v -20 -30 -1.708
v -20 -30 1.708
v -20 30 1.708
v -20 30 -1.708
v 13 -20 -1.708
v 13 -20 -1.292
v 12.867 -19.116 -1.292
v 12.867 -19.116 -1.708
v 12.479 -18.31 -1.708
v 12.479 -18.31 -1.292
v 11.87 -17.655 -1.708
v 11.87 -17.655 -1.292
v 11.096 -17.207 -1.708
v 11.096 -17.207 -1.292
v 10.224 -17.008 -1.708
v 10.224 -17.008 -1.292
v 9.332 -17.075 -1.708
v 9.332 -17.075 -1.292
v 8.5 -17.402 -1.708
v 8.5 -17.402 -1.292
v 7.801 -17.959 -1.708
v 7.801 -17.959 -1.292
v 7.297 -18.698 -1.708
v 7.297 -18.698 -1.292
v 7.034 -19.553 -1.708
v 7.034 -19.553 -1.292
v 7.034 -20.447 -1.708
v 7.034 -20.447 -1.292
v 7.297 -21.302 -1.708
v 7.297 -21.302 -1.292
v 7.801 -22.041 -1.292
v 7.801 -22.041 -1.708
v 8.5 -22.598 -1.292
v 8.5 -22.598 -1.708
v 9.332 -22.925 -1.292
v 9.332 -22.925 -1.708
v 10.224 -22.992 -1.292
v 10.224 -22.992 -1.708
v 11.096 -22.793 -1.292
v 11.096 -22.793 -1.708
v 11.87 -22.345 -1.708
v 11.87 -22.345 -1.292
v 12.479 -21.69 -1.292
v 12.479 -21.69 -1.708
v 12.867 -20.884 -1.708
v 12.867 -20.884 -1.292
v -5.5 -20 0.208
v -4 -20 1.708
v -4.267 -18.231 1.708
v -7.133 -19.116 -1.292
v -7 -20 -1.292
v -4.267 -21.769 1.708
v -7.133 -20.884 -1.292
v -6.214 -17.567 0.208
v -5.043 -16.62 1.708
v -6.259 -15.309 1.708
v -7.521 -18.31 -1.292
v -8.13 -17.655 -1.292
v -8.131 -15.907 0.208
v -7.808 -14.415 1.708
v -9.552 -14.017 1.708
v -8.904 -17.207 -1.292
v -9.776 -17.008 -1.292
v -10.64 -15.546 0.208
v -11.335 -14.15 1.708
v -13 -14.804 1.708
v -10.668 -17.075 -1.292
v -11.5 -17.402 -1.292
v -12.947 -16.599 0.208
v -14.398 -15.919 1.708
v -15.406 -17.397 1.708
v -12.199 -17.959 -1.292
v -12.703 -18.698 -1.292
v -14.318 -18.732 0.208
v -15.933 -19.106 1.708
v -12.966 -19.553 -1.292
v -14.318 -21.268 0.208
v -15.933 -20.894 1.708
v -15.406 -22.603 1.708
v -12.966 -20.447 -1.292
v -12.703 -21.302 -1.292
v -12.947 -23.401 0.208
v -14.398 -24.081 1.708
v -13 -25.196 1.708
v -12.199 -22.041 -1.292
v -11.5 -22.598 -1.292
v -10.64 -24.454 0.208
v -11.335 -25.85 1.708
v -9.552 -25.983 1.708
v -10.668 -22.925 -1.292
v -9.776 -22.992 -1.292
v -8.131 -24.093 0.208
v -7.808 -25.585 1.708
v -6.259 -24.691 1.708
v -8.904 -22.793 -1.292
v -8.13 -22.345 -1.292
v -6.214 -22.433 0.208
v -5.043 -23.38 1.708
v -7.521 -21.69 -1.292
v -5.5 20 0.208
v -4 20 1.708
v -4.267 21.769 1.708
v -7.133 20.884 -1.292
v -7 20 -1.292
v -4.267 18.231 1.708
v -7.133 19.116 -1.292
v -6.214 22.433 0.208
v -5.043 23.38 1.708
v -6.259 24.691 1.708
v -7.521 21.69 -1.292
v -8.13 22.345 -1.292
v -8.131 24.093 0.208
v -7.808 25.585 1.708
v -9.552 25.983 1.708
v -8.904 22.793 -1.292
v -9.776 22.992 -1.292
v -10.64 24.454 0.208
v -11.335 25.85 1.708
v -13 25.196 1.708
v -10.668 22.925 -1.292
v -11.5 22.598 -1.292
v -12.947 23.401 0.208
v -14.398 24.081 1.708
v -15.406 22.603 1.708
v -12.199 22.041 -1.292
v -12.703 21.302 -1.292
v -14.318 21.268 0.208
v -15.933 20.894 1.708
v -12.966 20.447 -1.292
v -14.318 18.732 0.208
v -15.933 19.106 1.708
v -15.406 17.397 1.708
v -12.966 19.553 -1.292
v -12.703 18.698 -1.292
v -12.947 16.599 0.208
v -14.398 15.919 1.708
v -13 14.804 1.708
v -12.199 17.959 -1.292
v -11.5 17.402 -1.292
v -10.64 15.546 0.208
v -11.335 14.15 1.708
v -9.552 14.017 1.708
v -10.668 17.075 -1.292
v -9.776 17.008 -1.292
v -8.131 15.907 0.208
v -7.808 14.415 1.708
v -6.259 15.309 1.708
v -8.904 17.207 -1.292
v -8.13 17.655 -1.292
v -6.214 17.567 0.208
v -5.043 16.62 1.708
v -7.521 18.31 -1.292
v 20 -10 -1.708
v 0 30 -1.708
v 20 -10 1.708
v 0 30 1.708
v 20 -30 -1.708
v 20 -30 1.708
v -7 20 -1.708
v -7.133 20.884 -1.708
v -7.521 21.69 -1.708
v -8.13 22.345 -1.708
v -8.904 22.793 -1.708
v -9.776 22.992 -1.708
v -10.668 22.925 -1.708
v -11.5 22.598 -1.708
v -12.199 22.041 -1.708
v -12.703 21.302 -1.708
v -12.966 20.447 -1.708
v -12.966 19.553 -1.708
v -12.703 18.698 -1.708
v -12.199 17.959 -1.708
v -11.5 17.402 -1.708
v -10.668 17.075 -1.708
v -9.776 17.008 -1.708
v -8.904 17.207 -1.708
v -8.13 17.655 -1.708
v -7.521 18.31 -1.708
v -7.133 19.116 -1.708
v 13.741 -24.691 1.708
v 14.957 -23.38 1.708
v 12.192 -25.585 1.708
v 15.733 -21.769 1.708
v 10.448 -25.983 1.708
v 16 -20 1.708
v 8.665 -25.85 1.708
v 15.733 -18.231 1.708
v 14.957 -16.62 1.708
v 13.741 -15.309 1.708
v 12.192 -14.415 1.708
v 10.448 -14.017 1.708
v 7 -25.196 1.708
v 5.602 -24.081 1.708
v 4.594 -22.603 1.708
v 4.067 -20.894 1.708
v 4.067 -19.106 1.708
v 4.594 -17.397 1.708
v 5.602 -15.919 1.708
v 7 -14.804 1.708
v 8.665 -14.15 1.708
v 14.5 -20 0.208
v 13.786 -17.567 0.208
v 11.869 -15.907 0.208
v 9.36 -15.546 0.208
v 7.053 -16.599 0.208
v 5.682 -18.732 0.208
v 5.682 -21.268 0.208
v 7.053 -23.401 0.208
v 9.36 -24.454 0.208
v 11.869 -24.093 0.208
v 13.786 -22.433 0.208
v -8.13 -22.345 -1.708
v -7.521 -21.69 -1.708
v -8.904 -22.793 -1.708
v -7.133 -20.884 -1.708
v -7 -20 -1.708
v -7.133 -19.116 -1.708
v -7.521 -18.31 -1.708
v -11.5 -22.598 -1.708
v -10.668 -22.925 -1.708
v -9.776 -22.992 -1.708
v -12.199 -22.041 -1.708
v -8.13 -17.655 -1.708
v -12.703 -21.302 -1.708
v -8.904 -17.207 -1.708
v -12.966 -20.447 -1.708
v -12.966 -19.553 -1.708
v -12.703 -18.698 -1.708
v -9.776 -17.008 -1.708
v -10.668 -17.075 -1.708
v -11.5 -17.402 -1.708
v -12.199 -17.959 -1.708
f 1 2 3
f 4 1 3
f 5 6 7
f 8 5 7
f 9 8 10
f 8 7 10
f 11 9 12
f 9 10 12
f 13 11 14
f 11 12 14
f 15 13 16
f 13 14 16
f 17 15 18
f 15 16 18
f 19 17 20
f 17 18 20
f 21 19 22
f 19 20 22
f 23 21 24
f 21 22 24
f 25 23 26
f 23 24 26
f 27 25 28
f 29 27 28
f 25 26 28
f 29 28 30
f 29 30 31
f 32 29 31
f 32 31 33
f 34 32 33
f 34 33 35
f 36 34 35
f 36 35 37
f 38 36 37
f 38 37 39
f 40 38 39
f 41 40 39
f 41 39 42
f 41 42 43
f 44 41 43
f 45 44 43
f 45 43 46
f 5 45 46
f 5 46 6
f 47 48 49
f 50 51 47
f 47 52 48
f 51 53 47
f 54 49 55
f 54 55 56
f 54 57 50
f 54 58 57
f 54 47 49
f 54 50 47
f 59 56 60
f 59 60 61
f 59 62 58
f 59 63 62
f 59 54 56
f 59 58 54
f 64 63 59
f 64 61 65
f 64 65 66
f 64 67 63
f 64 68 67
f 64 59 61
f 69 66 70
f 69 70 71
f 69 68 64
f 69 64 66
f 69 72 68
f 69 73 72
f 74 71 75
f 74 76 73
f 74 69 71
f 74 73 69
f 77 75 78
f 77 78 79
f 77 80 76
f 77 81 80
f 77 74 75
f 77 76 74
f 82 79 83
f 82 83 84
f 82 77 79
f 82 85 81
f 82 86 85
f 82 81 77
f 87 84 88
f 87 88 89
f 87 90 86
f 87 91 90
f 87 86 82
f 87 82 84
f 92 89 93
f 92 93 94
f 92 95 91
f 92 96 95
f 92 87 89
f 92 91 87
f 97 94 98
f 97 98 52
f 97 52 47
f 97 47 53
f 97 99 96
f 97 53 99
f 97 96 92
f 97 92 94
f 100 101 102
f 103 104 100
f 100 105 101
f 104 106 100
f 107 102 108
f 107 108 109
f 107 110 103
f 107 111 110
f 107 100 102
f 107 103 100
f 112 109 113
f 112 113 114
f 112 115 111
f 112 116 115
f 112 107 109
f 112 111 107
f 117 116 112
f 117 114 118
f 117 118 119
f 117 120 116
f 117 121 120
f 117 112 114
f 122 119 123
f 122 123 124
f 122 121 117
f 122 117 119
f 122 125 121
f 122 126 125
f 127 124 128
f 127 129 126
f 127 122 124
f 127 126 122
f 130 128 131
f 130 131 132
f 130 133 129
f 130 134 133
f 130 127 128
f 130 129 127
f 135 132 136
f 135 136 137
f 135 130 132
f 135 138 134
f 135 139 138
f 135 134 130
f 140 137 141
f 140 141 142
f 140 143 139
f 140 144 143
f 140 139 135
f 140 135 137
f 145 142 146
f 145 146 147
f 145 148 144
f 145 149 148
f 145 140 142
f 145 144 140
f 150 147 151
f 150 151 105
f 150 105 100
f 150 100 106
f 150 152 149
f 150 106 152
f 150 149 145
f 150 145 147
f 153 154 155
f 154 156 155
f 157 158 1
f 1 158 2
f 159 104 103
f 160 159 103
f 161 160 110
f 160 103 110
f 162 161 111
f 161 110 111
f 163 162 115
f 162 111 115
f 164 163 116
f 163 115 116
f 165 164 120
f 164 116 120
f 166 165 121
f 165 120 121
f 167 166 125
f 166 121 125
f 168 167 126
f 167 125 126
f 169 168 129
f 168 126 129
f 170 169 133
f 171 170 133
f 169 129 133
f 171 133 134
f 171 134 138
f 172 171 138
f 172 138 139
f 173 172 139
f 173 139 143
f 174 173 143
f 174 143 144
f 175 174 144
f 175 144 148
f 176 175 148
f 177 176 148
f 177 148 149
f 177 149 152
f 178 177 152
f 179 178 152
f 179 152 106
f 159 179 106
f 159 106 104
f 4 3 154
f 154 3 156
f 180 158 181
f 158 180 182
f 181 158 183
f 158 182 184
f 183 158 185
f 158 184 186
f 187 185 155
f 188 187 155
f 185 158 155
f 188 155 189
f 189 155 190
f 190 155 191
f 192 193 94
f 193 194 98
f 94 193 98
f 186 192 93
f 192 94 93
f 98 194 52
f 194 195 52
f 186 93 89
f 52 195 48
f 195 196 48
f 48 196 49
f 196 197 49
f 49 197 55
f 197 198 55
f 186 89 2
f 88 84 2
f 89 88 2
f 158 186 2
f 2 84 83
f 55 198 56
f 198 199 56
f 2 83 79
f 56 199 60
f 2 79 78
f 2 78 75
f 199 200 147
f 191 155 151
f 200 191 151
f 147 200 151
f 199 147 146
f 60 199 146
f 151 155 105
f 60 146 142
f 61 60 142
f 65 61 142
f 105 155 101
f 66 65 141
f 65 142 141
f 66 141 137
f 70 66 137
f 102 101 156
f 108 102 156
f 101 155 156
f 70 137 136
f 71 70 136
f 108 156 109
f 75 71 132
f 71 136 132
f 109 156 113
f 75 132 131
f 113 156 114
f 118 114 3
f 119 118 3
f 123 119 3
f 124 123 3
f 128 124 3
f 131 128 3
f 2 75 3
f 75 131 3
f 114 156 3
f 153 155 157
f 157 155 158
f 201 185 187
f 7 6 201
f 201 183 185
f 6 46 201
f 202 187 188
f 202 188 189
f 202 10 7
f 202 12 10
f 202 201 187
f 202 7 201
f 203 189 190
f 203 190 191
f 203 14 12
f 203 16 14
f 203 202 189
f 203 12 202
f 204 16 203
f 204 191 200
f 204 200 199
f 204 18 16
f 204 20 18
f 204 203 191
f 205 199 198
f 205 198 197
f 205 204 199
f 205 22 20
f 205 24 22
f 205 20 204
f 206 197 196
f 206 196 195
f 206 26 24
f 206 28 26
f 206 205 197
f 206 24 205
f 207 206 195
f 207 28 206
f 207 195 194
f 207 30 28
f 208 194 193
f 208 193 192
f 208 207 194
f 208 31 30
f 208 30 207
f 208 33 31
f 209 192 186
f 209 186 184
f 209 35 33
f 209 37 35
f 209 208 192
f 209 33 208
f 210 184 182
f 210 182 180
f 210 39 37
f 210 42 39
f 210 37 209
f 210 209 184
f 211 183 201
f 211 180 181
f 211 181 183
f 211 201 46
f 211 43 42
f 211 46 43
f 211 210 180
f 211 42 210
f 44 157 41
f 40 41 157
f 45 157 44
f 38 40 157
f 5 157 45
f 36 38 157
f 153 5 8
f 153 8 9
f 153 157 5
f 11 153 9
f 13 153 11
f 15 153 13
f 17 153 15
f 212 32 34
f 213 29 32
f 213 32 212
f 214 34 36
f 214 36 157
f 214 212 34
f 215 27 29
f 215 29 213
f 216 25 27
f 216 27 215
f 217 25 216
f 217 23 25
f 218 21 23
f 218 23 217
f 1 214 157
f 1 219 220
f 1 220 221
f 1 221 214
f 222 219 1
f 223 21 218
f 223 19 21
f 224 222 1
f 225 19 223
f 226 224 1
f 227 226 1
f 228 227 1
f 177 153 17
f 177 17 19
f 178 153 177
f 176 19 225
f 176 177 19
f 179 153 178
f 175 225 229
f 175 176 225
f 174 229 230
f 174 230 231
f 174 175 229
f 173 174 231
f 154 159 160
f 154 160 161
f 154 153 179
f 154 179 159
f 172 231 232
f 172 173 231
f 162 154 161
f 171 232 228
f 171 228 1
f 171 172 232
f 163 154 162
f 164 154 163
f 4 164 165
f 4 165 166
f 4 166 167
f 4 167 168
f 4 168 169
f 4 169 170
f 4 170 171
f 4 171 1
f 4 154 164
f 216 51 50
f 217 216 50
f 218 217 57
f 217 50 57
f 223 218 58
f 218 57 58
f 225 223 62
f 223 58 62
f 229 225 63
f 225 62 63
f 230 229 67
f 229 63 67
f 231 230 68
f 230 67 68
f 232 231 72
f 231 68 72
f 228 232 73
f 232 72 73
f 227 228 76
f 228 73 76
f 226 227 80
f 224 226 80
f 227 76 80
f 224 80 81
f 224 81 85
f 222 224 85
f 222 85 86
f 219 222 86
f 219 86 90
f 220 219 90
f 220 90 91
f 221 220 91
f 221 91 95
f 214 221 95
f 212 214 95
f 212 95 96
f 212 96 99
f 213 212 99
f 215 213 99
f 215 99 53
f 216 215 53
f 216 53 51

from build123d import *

# Parameters (mm, degrees)
BOSS_EXTRUDE1_DEPTH = 1.708
SKETCH2_R           = 3
CUT_EXTRUDE1_DEPTH  = 4.416
CHAMFER1_SIZE       = 3


with BuildPart() as part:
    # Sketch1 → Boss-Extrude1 (new body, symmetric)
    with BuildSketch(Plane.XY):
        Polygon((-20, -30), (-20, 30), (0, 30), (20, -10), (20, -30), align=None)
    extrude(amount=BOSS_EXTRUDE1_DEPTH, both=True)

    # Sketch2 → Cut-Extrude1 (cut, through all)
    with BuildSketch(Plane.XY.offset(1.708)):
        with Locations((-10, 20)):
            Circle(SKETCH2_R)
        with Locations((-10, -20)):
            Circle(SKETCH2_R)
        with Locations((10, -20)):
            Circle(SKETCH2_R)
    extrude(amount=-CUT_EXTRUDE1_DEPTH, mode=Mode.SUBTRACT)

    # Chamfer1
    chamfer1_edges = [part.edges().sort_by_distance(p)[0] for p in [
        (-13, 20, 1.708),
        (-13, -20, 1.708),
        (7, -20, 1.708),
    ]]
    chamfer(chamfer1_edges, length=CHAMFER1_SIZE)


solid = part.part
